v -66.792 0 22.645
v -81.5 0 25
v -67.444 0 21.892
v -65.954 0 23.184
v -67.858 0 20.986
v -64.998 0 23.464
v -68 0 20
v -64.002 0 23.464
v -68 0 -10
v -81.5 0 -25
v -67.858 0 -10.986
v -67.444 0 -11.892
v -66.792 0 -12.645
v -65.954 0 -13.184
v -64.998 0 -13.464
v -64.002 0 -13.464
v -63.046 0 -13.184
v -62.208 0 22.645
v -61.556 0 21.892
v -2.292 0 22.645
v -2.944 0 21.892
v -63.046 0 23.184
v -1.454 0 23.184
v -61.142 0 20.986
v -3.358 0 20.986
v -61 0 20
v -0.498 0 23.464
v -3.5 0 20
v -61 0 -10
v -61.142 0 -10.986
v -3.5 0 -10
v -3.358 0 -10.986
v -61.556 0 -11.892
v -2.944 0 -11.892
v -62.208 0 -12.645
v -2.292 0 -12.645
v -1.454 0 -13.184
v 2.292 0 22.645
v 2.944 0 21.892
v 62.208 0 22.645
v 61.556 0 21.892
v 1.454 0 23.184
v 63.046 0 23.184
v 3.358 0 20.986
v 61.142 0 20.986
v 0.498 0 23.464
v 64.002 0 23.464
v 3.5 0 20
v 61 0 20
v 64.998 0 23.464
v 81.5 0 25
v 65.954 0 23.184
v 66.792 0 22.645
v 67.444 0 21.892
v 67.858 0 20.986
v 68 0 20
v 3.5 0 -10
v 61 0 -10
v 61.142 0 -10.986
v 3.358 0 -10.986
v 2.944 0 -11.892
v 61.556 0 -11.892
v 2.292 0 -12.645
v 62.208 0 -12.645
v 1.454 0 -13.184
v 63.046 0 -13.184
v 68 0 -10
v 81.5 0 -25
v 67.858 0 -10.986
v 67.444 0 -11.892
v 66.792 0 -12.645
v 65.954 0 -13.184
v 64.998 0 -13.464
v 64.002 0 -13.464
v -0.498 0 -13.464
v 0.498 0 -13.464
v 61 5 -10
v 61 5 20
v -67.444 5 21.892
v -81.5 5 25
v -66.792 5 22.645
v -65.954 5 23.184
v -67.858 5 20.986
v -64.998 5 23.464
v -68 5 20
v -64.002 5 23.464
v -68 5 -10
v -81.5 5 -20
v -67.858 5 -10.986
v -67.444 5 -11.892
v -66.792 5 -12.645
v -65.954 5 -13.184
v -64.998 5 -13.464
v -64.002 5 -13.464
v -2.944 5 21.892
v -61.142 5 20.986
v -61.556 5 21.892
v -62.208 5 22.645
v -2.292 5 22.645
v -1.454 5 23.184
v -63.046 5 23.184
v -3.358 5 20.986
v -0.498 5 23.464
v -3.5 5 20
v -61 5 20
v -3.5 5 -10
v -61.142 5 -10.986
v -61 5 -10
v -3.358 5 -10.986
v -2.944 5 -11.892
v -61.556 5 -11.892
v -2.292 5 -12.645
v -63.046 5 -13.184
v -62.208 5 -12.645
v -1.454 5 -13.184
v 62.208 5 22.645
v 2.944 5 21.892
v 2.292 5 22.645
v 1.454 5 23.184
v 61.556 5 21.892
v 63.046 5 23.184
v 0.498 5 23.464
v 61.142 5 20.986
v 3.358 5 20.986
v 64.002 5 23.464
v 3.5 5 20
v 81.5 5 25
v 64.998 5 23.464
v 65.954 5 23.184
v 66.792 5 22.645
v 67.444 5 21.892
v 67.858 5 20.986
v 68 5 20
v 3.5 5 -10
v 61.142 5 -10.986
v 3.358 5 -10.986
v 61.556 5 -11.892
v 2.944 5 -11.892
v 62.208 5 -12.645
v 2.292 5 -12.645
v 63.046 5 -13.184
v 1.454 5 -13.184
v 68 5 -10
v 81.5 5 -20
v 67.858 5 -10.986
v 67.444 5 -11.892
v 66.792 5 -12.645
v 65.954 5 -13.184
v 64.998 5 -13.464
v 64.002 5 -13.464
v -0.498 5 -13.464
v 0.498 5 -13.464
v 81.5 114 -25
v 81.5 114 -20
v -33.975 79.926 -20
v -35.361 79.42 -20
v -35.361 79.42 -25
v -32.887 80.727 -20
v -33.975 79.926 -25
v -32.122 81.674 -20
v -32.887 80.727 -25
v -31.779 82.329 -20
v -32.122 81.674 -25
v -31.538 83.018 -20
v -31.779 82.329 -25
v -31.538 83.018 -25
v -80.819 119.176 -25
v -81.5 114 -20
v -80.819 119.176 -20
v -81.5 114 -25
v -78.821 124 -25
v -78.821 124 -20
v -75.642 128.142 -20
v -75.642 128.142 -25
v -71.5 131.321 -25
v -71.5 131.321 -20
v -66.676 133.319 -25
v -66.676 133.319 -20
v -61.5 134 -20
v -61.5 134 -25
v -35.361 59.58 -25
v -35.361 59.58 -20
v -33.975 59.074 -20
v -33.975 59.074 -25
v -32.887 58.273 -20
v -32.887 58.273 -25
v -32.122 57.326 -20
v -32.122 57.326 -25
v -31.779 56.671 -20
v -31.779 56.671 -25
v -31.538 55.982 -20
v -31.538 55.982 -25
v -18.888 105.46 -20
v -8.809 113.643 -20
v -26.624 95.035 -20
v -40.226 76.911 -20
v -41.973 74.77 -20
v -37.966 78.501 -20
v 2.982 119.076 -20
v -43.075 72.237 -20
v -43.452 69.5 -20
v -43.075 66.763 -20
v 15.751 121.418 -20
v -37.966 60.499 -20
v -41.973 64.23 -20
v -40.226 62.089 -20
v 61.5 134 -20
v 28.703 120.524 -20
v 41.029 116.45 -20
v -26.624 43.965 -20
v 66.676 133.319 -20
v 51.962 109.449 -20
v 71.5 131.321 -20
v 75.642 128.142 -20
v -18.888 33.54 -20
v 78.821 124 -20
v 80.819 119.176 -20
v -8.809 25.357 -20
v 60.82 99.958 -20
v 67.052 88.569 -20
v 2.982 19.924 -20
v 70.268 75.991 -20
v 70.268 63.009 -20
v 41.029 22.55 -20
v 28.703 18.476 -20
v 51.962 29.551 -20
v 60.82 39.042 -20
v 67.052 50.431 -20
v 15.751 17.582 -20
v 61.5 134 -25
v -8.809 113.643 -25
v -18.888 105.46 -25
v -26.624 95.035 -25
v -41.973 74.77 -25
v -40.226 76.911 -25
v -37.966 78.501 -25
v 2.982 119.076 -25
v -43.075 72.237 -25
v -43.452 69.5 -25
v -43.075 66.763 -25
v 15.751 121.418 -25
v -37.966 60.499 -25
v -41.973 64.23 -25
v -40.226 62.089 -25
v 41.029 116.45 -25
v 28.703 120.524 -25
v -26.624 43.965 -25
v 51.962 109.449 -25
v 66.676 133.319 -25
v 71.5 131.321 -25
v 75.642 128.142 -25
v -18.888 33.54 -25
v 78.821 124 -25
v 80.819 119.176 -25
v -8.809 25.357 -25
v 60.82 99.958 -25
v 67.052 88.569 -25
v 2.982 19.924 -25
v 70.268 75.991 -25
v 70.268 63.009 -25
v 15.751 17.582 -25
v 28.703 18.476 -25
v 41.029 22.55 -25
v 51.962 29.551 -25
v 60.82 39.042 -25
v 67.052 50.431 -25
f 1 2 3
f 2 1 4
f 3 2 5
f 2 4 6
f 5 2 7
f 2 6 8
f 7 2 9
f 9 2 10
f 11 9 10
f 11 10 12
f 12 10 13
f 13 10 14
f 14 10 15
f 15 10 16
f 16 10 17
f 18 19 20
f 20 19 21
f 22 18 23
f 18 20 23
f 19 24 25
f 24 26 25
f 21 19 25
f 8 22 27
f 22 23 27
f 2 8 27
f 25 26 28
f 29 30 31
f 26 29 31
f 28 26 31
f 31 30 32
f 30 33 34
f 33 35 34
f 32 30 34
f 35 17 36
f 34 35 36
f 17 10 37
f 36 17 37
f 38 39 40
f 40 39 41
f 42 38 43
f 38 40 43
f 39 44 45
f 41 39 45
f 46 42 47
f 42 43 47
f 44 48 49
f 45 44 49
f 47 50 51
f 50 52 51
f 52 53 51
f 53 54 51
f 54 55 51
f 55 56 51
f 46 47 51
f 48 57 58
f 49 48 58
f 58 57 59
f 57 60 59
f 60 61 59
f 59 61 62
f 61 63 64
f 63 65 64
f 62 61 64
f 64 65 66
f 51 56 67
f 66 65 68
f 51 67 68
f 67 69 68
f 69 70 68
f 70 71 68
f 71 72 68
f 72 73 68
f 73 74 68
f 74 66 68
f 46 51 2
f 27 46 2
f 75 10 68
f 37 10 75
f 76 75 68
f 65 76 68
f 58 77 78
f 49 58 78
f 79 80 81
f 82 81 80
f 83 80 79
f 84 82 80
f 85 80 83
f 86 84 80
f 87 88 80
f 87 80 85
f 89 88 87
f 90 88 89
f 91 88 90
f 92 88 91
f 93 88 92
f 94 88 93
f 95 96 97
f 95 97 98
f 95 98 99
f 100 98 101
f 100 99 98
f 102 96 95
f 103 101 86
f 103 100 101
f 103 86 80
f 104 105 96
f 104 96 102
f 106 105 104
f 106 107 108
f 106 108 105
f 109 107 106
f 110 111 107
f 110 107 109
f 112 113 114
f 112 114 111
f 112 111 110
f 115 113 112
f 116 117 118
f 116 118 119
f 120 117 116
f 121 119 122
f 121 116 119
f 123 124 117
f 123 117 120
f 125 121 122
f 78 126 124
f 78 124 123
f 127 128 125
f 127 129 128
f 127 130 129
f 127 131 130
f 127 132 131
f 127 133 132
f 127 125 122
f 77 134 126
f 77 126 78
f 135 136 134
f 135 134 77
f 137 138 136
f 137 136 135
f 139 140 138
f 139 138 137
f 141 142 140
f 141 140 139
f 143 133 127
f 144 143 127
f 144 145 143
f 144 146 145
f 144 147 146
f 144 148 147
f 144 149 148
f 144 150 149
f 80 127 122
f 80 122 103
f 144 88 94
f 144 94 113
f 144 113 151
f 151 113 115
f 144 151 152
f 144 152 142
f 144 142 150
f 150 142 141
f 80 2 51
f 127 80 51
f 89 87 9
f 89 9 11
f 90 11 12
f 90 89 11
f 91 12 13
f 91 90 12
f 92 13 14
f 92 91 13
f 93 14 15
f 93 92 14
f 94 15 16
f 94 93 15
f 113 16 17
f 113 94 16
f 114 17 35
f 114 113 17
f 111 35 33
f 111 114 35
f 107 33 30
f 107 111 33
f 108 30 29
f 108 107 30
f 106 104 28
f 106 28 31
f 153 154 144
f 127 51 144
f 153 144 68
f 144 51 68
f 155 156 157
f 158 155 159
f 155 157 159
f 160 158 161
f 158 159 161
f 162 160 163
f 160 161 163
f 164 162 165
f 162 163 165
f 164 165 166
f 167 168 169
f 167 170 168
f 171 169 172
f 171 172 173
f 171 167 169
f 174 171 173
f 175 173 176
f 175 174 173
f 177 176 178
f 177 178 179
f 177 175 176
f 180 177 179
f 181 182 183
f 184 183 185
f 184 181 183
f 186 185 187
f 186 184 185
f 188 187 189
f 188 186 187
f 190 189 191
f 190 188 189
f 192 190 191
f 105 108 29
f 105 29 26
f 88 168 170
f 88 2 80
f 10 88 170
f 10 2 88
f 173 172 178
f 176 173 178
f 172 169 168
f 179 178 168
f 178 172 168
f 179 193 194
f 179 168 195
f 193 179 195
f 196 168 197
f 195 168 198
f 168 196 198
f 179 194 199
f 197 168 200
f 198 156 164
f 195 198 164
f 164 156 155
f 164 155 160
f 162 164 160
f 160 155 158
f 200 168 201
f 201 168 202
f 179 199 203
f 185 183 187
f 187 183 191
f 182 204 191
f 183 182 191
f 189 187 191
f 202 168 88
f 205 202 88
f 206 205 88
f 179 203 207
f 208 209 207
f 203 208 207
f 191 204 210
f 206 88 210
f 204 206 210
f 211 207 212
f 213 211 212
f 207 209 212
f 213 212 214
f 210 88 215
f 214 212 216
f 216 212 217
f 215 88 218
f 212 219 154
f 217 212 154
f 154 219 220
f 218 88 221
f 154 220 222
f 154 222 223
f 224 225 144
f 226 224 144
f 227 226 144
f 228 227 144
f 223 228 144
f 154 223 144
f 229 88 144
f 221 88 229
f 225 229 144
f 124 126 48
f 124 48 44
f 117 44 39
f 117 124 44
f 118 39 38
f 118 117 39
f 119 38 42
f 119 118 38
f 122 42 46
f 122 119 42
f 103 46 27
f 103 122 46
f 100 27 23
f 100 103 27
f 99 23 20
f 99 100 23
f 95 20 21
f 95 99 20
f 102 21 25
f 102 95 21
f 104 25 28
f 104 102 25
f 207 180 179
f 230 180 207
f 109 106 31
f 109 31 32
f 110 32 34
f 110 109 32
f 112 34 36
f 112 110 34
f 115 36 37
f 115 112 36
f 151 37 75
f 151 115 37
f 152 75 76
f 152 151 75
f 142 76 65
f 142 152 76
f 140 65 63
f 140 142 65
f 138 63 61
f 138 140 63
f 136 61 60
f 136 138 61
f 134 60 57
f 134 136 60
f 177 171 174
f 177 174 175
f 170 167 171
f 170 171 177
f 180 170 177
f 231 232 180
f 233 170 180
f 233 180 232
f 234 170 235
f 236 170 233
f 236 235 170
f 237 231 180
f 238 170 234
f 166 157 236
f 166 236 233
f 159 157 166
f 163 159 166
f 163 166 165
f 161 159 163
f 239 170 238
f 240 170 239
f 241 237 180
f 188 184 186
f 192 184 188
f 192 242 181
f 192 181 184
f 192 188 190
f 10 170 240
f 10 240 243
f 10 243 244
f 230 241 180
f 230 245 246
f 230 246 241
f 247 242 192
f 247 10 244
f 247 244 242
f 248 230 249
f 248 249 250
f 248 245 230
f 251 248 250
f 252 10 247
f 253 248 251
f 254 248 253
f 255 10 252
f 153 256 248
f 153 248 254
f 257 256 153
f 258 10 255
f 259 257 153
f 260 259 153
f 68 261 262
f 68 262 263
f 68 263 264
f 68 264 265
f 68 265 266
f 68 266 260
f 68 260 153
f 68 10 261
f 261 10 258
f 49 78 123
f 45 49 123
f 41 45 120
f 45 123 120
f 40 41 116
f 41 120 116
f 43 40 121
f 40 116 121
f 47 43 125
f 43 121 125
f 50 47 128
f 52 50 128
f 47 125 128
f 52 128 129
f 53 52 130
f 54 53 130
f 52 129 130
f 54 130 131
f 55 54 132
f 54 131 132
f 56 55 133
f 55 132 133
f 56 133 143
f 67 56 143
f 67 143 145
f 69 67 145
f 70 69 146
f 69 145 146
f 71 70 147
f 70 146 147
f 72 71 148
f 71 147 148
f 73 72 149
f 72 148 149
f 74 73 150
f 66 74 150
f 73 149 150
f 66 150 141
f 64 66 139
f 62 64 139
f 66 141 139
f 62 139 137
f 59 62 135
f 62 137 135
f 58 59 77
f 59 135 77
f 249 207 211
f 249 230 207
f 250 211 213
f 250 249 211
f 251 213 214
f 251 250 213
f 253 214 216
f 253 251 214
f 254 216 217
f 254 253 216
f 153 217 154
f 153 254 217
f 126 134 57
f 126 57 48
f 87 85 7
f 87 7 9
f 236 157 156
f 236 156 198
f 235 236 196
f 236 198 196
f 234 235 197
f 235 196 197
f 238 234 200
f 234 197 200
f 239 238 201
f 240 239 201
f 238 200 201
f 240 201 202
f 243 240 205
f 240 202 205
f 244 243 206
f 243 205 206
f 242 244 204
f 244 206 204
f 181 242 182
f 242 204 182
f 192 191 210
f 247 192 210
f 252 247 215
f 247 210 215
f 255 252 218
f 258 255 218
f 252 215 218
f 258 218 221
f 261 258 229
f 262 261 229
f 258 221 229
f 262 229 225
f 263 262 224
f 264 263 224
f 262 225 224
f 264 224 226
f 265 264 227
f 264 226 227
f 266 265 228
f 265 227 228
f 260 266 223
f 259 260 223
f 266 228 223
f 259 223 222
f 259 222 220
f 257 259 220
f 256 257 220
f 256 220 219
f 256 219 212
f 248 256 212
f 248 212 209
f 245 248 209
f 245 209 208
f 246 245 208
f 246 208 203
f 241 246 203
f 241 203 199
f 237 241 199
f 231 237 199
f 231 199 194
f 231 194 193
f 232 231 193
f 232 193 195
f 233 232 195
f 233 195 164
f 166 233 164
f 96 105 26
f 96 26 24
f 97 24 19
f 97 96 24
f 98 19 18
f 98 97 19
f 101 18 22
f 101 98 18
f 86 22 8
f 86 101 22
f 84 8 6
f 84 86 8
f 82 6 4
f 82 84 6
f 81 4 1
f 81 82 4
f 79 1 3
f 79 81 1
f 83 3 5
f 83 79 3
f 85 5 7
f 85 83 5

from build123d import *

# Parameters (mm, degrees)
SKETCH1_W           = 163
SKETCH1_H           = 50
BOSS_EXTRUDE1_DEPTH = 5
SKETCH6_W           = 163
SKETCH6_H           = 5
BOSS_EXTRUDE2_DEPTH = 129
CUT_EXTRUDE1_DEPTH  = 164.166326183
FILLET1_R           = 5
FILLET2_R           = 20
CUT_EXTRUDE2_DEPTH  = 155.622928594
CUT_EXTRUDE3_DEPTH  = 155.622928594


with BuildPart() as part:
    # Sketch1 → Boss-Extrude1 (new body)
    with BuildSketch(Plane(origin=(0, 0, 0), x_dir=(1, 0, 0), z_dir=(0, 1, 0))):
        Rectangle(SKETCH1_W, SKETCH1_H)
    extrude(amount=BOSS_EXTRUDE1_DEPTH)

    # Sketch6 → Boss-Extrude2 (add)
    with BuildSketch(Plane(origin=(0, 5, 0), x_dir=(1, 0, 0), z_dir=(0, 1, 0))):
        with Locations((0, 22.5)):
            Rectangle(SKETCH6_W, SKETCH6_H)
    extrude(amount=BOSS_EXTRUDE2_DEPTH)

    # Sketch7 → Cut-Extrude1 (cut, through all)
    with BuildSketch(Plane.XY.offset(-20)):
        with BuildLine():
            ThreePointArc((-32.33968901, 59.421555555), (70.67427925, 69.5), (-32.33968901, 79.578444445))
            ThreePointArc((-32.33968901, 79.578444445), (-43.452284877, 69.5), (-32.33968901, 59.421555555))
        make_face()
    extrude(amount=-CUT_EXTRUDE1_DEPTH, mode=Mode.SUBTRACT)

    # Fillet1
    fillet1_edges = [part.edges().sort_by_distance(p)[0] for p in [
        (-32.33968901, 59.421555555, -22.5),
        (-32.33968901, 79.578444445, -22.5),
    ]]
    fillet(fillet1_edges, radius=FILLET1_R)

    # Fillet2
    fillet2_edges = [part.edges().sort_by_distance(p)[0] for p in [
        (-81.5, 134, -22.5),
        (81.5, 134, -22.5),
    ]]
    fillet(fillet2_edges, radius=FILLET2_R)

    # Sketch9 → Cut-Extrude2 (cut, through all)
    with BuildSketch(Plane(origin=(0, 5, 0), x_dir=(1, 0, 0), z_dir=(0, 1, 0))):
        with BuildLine():
            Line((-61, 10), (-61, -20))
            ThreePointArc((-61, -20), (-64.5, -23.5), (-68, -20))
            Line((-68, -20), (-68, 10))
            ThreePointArc((-68, 10), (-64.5, 13.5), (-61, 10))
        make_face()
    cut_extrude2 = extrude(amount=-CUT_EXTRUDE2_DEPTH, mode=Mode.SUBTRACT)

    # Mirror3: Cut-Extrude2 across plane
    add(cut_extrude2.mirror(Plane(origin=(0, 0, 0), x_dir=(0, 0, 1), z_dir=(1, 0, 0))), mode=Mode.SUBTRACT)

    # Sketch10 → Cut-Extrude3 (cut, through all)
    with BuildSketch(Plane(origin=(0, 5, 0), x_dir=(1, 0, 0), z_dir=(0, 1, 0))):
        with BuildLine():
            Line((3.5, 10), (3.5, -20))
            ThreePointArc((3.5, -20), (0, -23.5), (-3.5, -20))
            Line((-3.5, -20), (-3.5, 10))
            ThreePointArc((-3.5, 10), (0, 13.5), (3.5, 10))
        make_face()
    extrude(amount=-CUT_EXTRUDE3_DEPTH, mode=Mode.SUBTRACT)


solid = part.part
